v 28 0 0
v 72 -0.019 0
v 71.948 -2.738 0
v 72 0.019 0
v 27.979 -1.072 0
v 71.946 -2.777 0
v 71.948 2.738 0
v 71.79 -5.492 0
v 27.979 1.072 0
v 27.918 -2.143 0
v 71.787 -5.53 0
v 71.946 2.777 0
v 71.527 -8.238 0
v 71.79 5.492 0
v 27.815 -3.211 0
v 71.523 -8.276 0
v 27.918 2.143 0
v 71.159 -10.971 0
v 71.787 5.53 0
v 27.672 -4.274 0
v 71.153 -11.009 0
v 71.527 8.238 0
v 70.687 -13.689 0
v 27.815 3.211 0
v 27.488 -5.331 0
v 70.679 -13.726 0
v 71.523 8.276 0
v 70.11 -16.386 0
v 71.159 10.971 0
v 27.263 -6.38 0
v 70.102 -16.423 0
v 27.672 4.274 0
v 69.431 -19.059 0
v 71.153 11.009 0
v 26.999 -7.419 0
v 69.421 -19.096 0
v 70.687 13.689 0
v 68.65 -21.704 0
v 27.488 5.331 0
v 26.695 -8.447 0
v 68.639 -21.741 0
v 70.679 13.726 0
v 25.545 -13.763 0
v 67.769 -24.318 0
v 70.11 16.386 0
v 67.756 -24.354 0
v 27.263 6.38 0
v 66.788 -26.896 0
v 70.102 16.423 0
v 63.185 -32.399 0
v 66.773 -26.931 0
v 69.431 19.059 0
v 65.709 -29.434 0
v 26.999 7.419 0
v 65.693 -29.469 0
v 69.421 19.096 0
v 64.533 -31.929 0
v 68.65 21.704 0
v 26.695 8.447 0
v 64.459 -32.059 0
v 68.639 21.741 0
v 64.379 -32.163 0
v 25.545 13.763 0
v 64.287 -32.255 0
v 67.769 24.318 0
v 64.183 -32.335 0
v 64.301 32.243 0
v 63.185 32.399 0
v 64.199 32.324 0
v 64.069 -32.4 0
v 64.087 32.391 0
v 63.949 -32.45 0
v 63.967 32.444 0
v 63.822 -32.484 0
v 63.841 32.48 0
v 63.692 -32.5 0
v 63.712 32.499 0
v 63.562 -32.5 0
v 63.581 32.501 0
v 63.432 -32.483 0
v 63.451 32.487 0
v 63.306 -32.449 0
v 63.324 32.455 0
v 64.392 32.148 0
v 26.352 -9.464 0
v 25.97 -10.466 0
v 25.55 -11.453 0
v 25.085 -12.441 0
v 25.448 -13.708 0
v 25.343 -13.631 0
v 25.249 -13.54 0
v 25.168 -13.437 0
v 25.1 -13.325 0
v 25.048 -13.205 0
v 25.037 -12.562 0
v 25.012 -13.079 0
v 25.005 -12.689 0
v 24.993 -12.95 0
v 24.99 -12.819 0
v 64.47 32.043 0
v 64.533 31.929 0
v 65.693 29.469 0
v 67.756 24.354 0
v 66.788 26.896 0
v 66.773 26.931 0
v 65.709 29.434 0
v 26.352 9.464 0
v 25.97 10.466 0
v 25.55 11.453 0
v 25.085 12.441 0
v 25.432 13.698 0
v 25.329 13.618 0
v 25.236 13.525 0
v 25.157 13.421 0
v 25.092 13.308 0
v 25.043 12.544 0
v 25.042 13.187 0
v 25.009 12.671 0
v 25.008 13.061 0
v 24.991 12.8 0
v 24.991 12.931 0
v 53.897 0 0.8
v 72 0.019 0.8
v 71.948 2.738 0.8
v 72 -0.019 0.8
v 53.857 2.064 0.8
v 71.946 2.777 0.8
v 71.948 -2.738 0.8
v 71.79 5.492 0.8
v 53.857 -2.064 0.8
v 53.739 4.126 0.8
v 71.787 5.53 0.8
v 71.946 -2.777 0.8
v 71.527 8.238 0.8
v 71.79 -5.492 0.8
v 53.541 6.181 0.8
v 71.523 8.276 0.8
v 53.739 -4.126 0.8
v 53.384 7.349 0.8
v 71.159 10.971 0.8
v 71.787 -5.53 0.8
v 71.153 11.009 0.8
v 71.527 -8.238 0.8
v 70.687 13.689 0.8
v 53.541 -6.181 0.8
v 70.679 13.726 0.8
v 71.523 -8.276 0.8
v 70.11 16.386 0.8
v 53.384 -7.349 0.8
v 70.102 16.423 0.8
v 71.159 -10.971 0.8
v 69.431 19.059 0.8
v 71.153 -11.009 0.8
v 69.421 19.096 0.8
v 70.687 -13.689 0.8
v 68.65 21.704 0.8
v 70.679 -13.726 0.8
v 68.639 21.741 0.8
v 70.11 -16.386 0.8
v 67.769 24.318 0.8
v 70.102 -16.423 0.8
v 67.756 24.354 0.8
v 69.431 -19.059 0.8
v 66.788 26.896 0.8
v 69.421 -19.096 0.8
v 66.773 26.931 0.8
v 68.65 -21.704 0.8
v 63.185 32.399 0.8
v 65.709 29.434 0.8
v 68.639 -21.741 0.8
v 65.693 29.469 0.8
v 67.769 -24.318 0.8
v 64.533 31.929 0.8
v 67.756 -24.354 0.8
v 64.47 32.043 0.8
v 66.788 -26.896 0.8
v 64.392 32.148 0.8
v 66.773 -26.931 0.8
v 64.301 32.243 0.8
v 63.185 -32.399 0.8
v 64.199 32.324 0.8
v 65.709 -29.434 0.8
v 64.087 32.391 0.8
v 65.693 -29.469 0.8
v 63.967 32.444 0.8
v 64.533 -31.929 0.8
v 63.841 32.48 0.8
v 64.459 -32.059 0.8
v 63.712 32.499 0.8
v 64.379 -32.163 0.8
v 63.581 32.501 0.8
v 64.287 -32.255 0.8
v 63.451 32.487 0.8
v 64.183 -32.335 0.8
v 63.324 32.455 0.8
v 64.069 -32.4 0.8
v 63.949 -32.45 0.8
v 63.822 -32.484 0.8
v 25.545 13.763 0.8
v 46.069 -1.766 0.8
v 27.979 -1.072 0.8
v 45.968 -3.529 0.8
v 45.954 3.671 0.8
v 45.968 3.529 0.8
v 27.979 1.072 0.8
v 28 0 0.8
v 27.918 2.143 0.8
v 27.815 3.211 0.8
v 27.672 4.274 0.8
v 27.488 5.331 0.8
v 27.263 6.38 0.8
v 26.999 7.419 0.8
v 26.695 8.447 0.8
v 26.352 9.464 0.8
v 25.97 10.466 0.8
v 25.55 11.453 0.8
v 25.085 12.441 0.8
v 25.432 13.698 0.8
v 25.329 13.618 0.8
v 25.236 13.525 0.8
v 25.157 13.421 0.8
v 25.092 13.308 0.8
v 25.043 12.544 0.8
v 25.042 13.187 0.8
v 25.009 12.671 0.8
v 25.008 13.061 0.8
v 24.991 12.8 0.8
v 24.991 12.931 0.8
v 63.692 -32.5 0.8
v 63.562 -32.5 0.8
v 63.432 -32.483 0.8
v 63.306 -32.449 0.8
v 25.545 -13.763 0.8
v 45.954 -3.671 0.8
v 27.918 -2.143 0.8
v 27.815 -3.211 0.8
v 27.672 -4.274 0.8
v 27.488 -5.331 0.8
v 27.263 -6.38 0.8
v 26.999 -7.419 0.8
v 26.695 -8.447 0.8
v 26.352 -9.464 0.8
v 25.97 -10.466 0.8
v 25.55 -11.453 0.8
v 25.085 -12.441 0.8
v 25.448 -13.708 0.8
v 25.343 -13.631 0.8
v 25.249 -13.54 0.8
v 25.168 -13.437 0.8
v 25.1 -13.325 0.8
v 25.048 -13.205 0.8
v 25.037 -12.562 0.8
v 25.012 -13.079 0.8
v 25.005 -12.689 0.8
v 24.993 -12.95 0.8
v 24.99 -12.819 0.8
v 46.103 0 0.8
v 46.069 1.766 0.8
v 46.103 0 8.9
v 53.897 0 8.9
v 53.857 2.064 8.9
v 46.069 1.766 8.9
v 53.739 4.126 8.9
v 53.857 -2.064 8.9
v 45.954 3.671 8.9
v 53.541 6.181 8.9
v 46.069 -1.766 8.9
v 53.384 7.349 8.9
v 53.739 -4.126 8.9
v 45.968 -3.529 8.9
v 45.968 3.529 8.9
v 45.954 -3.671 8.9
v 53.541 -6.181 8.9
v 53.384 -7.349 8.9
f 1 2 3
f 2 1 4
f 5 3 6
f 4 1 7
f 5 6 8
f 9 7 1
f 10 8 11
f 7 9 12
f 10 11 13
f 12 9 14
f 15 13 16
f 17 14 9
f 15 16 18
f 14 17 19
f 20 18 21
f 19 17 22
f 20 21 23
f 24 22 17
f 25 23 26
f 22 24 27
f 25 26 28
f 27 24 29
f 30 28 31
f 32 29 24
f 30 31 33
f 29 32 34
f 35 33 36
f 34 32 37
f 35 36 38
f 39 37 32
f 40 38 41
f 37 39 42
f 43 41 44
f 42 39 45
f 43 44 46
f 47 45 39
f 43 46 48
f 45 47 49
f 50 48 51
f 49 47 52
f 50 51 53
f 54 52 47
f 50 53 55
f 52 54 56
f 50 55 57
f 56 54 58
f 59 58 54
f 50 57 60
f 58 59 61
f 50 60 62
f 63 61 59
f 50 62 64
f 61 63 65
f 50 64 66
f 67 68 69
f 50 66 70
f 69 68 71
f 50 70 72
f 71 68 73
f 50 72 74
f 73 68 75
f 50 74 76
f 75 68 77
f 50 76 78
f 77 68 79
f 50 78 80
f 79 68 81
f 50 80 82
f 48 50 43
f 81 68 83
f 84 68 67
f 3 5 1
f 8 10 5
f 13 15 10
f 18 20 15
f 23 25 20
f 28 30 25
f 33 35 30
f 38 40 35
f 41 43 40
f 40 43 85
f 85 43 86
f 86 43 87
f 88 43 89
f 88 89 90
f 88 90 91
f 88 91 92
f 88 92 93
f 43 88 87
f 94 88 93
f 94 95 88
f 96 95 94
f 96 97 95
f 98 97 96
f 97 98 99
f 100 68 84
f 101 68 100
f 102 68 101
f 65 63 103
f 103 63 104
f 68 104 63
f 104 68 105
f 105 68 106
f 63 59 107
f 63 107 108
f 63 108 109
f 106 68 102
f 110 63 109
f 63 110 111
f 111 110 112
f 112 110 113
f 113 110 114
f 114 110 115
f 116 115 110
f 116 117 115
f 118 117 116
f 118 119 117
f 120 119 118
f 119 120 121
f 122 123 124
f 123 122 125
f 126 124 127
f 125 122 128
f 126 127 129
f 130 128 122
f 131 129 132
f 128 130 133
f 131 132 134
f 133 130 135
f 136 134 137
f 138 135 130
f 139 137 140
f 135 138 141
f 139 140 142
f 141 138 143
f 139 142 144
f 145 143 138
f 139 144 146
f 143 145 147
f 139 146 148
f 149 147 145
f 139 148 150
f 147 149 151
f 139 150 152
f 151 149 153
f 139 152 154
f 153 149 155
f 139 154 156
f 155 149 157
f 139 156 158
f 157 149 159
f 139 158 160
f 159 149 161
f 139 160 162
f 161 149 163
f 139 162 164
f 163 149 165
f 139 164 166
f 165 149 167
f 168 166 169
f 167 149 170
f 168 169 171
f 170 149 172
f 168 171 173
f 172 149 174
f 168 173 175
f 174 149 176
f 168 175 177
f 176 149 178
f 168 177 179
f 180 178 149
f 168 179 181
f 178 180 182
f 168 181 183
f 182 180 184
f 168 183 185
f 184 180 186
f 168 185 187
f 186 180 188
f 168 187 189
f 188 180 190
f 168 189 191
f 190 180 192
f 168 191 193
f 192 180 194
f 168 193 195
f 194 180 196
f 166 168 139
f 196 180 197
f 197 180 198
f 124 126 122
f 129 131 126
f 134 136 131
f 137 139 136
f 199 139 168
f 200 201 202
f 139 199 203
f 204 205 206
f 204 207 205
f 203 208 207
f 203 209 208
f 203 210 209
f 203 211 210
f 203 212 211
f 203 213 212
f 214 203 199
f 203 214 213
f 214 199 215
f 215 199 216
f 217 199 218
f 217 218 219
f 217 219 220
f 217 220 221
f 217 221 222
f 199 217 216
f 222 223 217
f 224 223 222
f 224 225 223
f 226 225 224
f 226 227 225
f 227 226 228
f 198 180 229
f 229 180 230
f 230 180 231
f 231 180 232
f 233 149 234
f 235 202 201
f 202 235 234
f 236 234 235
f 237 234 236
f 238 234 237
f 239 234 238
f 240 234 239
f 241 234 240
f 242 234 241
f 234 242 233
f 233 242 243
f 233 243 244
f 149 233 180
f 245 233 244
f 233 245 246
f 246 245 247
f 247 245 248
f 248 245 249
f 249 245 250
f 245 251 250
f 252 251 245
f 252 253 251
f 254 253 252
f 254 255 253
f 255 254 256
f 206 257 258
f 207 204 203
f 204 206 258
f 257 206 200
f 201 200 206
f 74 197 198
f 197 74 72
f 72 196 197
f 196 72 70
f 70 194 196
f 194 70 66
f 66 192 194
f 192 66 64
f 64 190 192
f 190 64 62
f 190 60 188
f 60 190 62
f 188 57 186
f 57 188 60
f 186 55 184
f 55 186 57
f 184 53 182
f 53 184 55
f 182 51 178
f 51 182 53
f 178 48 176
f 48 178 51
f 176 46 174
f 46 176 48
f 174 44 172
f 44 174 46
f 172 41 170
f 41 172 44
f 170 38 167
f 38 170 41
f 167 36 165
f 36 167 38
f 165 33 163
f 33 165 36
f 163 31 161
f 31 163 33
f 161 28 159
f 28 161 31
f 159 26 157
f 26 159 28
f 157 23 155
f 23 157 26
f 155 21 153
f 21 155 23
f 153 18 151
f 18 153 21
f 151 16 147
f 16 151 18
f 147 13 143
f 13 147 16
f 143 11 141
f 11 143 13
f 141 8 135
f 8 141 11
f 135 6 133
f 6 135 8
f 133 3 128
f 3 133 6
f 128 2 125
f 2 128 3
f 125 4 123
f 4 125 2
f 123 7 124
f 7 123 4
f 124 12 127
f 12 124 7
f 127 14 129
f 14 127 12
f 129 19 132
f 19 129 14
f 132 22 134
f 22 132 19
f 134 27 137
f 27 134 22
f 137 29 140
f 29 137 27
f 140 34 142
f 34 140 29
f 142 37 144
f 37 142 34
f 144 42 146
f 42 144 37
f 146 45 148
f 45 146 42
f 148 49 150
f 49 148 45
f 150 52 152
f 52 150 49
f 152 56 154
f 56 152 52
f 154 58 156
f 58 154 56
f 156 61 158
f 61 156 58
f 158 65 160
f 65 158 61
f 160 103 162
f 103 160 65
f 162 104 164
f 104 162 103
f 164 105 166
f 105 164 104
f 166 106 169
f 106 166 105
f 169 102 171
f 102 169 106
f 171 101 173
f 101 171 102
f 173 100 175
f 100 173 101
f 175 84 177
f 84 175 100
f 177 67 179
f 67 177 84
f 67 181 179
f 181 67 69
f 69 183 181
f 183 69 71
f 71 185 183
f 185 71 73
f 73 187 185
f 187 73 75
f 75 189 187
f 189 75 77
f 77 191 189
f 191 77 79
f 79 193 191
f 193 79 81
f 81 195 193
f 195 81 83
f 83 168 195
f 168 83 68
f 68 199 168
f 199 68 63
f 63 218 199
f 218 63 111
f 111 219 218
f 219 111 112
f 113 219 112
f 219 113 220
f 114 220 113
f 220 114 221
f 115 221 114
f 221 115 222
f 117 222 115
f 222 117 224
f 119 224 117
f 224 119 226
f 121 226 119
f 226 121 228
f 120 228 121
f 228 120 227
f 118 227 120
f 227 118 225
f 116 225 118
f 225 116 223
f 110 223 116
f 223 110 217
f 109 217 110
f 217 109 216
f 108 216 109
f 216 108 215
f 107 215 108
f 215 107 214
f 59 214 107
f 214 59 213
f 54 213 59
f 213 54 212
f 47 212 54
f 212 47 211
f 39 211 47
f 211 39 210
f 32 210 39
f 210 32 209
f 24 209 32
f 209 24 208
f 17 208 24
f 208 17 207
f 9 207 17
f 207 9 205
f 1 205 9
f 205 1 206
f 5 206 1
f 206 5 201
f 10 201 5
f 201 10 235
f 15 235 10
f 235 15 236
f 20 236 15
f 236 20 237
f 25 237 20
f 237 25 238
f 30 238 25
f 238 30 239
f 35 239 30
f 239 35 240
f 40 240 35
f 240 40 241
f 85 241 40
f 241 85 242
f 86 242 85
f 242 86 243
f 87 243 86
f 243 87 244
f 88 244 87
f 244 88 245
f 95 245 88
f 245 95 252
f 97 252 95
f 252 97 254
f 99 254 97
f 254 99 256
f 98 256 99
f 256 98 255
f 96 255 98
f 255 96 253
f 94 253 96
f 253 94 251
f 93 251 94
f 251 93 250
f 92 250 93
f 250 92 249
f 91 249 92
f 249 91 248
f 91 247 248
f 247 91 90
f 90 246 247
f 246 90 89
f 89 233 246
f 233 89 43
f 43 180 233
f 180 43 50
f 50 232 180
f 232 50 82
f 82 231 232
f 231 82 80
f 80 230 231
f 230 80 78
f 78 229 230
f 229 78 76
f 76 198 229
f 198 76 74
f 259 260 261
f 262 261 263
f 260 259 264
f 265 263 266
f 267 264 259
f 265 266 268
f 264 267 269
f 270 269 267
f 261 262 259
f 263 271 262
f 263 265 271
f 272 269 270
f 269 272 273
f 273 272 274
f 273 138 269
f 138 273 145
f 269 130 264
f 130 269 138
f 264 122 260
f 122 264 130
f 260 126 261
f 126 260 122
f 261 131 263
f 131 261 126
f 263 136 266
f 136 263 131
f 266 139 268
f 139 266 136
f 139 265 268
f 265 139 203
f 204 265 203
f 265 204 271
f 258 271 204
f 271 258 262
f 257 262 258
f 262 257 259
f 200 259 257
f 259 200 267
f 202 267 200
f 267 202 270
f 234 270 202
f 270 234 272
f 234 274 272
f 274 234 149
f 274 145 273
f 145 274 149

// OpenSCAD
// file: parameters.scad
// =============================================================================
// Gen-BL — nightly 2026-10-06 (physics_scorer, honest magpylib watts)
// Dense-wind, smaller gap: the wire budget (not the window) limits these machines, so the same ~367 m of 26 AWG is laid layer-by-layer at fill 0.65 into a SHORTER 8.1 mm window (vs 9.0 mm on Gen-BI) with a 17.1 mm build on 29–71 mm sector bobbins. That shrinks the magnet-to-magnet gap 11.6 → 10.7 mm, so every turn sees more flux. Rotors, Ø5 tight-assist map and Ø134 × 4.76 mm steel are identical to Gen-BI (modular: only bobbins, stator and gap sleeve change).
// Clocking 0 deg (magnets N facing S) + D-flat keyed bore + index notch + flip-symmetric hole map.
// Windable 2-piece bobbin; turns = physics_scorer turns_fit; copper only between flanges.
// Steel back-iron: 2× Ø134 × 4.76 mm (3/16") mild-steel discs (steel_backiron_disc.dxf); magnets sit ON the steel
// (through-pockets) -> score with --back-iron.
// =============================================================================
topology            = "dual_rotor";

// --- Wire / winding (physics_scorer winding-fit) -------------------------------
wire_awg            = 26;
wire_od             = 0.45;     // insulated OD mm (bare 0.405)
fill_realistic      = 0.65;     // insulated-wire area / window (DENSE layered wind with a jig; scorer cap 0.65)
turns               = 566;       // = physics_scorer turns_fit (do NOT raise)
coil_former_type    = "bobbin";
coil_core_inset     = 17.10;     // radial copper build: hub = copper boundary inset by this
wind_build_axial    = 0.0;      // nothing proud of the flanges
wind_build_radial   = 0.0;

// --- Bobbin (base + lid) ---------------------------------------------------------
coil_id_r           = 29.00;    // copper boundary sector
coil_od_r           = 71.00;
span_deg            = 52.68;    // = pitch - 2*asin((wall+0.85)/coil_id_r) -> >=1.2 mm stator web
former_web          = 8.10;     // copper height between flanges (TALL copper: steel keeps Bz up)
flange_t            = 0.80;     // >= 0.8 mm FDM wall rule (tall winds push on the flanges)
wall                = 1.00;     // flange lip beyond copper
former_bare_h       = former_web + 2 * flange_t;
coil_envelope_h     = former_bare_h + 2 * wind_build_axial;
tab_w               = 7.0;
tab_len             = 7.0;
tab_h               = former_bare_h / 2;
pin_d               = 1.9;      // 1.75 mm filament locating pin
coil_mount_r        = coil_od_r + 0.2 + 4.0;
lead_y              = 1.6;
lead_slot_w         = 0.9;
lead_groove_d       = 0.6;

// --- Gap -------------------------------------------------------------------------
run_clear           = 0.50;     // rotor face -> flange
gap_spacer_h        = run_clear + wind_build_axial;
m2m                 = coil_envelope_h + 2 * run_clear;   // rotor face to rotor face (= gap_sleeve length)

// --- Stator ----------------------------------------------------------------------
coil_stations       = 6;
bay_clear           = 0.25;
stator_thick        = former_bare_h;                        // bobbins flush both faces
stator_od           = 160;
shaft_clear_stator  = 14.0;     // stator is static; gap sleeve OD 12 spins inside

// --- Rotor(s) --------------------------------------------------------------------
magnet_Br           = 1.43;     // N52
magnet_d_large      = 20.0;
magnet_h_large      = 5.0;      // one O20x5 per pocket
magnet_h_small      = 5.0;      // one O5x5 per pocket
halbach_magnetisation = "diametric"; // O5x5 assist magnets MUST be DIAMETRICALLY magnetised (tangential)
rotor_b_same_axis   = true;     // same-index magnets share one axis: N faces S across the gap
large_pocket_d      = 20.3;
small_pocket_d      = 5.3;
pocket_h            = 5.10;     // THROUGH the carrier: magnet back face sits on the steel disc
large_n             = 8;
R_large             = 50.0;
R_small_inner       = 40.0;
R_small_mid         = 50.0;
R_small_outer       = 60.0;
small_r_list        = [R_small_inner, R_small_mid, R_small_outer];   // O5 pockets between poles
carrier_od          = 134.0;
carrier_thick       = pocket_h;
hub_h               = 12.0;     // > steel_t + insert: radial set-screw clears the steel
hub_od              = 24.0;     // slim hub so the M4 brace rods fit at R~18 inside the coil ring
hub_insert_d        = 4.0;      // M3 heat-set insert, radial, bears on the D-flat
rotor_b_offset_deg  = 0.0;      // CLOCKING: magnets directly opposite
shaft_key           = "dflat";
dflat_depth         = 0.5;      // 8 mm shaft with 0.5 mm flat (7.5 across flat)
index_notch_d       = 3.0;

// --- Steel back-iron (buyable laser-cut) -------------------------------------------
steel_t             = 4.76;      // mild steel thickness (image method ignores it; sized from steel_flux.py so the return path stays well below saturation)
steel_center_hole   = 26.0;     // slips over the rotor hub (OD 24)
steel_od            = carrier_od;   // steel disc OD = rotor carrier OD

// --- Modular MAX interface ----------------------------------------------------------
shaft_bore          = 8.35;
dflat_x             = 4.0 - dflat_depth + (shaft_bore - 8.0) / 2;
bearing_d           = 21.85;
bearing_h           = 7.2;
m3_clear            = 3.5;
bolt_r_inner        = 30.0;     // M3 steel-disc clamp bolts (inside the magnet ring)
bolt_n_inner        = 4;
bolt_inner_angles   = [0, 90, 180, 270];
bolt_r_outer        = 63.0;     // M3 steel-disc clamp bolts (outside the magnet ring)
bolt_outer_angles   = [45, 135, 225, 315];
flange_bolt_r       = 73.0;     // frame rods: OUTSIDE the rotor OD (rotors spin inside them)
flange_bolt_n       = 6;
flange_bolt_offset  = 30.00;    // between coil stations -> never cuts a lead groove/tab
brace_r             = 18.0;
brace_d             = 4.3;      // temporary M4 jack rods (assembly only)
brace_n             = 4;
brace_angles        = [45, 135, 225, 315];          // flip-symmetric

spacer_pad_od       = 14.0;
spacer_pad_id       = m3_clear;
endbell_od          = 160;
endbell_thick       = 8.0;
endbell_shaft_clear = 10.0;
collar_h            = 10.0;
standoff_od         = 9.0;
frame_standoff_h    = run_clear + carrier_thick + hub_h + collar_h + 2.0;
sleeve_od           = 12.0;
plate_max_mm        = 410;

$fn = 64;
// main file
// Gen-BL — bobbin BASE (bottom flange + hub). Print x6, flange down. Wind 26 AWG x 566 t around
// the hub with the LID glued on (coil_lid.stl). Copper lives ONLY between the flanges (no proud winds).
include <parameters.scad>;
$fn = 48;
module sector_2d(r_in, r_out, ang) {
    polygon([
        for (a = [-ang/2 : ang/24 : ang/2]) [r_in*cos(a), r_in*sin(a)],
        for (a = [ang/2 : -ang/24 : -ang/2]) [r_out*cos(a), r_out*sin(a)]
    ]);
}
module footprint_2d() { offset(r=wall) sector_2d(coil_id_r, coil_od_r, span_deg); }
module hub_2d()       { offset(delta=-coil_core_inset) sector_2d(coil_id_r, coil_od_r, span_deg); }

union() {
    linear_extrude(flange_t) footprint_2d();
    translate([0, 0, flange_t - 0.01]) linear_extrude(former_web + 0.01) hub_2d();
}
